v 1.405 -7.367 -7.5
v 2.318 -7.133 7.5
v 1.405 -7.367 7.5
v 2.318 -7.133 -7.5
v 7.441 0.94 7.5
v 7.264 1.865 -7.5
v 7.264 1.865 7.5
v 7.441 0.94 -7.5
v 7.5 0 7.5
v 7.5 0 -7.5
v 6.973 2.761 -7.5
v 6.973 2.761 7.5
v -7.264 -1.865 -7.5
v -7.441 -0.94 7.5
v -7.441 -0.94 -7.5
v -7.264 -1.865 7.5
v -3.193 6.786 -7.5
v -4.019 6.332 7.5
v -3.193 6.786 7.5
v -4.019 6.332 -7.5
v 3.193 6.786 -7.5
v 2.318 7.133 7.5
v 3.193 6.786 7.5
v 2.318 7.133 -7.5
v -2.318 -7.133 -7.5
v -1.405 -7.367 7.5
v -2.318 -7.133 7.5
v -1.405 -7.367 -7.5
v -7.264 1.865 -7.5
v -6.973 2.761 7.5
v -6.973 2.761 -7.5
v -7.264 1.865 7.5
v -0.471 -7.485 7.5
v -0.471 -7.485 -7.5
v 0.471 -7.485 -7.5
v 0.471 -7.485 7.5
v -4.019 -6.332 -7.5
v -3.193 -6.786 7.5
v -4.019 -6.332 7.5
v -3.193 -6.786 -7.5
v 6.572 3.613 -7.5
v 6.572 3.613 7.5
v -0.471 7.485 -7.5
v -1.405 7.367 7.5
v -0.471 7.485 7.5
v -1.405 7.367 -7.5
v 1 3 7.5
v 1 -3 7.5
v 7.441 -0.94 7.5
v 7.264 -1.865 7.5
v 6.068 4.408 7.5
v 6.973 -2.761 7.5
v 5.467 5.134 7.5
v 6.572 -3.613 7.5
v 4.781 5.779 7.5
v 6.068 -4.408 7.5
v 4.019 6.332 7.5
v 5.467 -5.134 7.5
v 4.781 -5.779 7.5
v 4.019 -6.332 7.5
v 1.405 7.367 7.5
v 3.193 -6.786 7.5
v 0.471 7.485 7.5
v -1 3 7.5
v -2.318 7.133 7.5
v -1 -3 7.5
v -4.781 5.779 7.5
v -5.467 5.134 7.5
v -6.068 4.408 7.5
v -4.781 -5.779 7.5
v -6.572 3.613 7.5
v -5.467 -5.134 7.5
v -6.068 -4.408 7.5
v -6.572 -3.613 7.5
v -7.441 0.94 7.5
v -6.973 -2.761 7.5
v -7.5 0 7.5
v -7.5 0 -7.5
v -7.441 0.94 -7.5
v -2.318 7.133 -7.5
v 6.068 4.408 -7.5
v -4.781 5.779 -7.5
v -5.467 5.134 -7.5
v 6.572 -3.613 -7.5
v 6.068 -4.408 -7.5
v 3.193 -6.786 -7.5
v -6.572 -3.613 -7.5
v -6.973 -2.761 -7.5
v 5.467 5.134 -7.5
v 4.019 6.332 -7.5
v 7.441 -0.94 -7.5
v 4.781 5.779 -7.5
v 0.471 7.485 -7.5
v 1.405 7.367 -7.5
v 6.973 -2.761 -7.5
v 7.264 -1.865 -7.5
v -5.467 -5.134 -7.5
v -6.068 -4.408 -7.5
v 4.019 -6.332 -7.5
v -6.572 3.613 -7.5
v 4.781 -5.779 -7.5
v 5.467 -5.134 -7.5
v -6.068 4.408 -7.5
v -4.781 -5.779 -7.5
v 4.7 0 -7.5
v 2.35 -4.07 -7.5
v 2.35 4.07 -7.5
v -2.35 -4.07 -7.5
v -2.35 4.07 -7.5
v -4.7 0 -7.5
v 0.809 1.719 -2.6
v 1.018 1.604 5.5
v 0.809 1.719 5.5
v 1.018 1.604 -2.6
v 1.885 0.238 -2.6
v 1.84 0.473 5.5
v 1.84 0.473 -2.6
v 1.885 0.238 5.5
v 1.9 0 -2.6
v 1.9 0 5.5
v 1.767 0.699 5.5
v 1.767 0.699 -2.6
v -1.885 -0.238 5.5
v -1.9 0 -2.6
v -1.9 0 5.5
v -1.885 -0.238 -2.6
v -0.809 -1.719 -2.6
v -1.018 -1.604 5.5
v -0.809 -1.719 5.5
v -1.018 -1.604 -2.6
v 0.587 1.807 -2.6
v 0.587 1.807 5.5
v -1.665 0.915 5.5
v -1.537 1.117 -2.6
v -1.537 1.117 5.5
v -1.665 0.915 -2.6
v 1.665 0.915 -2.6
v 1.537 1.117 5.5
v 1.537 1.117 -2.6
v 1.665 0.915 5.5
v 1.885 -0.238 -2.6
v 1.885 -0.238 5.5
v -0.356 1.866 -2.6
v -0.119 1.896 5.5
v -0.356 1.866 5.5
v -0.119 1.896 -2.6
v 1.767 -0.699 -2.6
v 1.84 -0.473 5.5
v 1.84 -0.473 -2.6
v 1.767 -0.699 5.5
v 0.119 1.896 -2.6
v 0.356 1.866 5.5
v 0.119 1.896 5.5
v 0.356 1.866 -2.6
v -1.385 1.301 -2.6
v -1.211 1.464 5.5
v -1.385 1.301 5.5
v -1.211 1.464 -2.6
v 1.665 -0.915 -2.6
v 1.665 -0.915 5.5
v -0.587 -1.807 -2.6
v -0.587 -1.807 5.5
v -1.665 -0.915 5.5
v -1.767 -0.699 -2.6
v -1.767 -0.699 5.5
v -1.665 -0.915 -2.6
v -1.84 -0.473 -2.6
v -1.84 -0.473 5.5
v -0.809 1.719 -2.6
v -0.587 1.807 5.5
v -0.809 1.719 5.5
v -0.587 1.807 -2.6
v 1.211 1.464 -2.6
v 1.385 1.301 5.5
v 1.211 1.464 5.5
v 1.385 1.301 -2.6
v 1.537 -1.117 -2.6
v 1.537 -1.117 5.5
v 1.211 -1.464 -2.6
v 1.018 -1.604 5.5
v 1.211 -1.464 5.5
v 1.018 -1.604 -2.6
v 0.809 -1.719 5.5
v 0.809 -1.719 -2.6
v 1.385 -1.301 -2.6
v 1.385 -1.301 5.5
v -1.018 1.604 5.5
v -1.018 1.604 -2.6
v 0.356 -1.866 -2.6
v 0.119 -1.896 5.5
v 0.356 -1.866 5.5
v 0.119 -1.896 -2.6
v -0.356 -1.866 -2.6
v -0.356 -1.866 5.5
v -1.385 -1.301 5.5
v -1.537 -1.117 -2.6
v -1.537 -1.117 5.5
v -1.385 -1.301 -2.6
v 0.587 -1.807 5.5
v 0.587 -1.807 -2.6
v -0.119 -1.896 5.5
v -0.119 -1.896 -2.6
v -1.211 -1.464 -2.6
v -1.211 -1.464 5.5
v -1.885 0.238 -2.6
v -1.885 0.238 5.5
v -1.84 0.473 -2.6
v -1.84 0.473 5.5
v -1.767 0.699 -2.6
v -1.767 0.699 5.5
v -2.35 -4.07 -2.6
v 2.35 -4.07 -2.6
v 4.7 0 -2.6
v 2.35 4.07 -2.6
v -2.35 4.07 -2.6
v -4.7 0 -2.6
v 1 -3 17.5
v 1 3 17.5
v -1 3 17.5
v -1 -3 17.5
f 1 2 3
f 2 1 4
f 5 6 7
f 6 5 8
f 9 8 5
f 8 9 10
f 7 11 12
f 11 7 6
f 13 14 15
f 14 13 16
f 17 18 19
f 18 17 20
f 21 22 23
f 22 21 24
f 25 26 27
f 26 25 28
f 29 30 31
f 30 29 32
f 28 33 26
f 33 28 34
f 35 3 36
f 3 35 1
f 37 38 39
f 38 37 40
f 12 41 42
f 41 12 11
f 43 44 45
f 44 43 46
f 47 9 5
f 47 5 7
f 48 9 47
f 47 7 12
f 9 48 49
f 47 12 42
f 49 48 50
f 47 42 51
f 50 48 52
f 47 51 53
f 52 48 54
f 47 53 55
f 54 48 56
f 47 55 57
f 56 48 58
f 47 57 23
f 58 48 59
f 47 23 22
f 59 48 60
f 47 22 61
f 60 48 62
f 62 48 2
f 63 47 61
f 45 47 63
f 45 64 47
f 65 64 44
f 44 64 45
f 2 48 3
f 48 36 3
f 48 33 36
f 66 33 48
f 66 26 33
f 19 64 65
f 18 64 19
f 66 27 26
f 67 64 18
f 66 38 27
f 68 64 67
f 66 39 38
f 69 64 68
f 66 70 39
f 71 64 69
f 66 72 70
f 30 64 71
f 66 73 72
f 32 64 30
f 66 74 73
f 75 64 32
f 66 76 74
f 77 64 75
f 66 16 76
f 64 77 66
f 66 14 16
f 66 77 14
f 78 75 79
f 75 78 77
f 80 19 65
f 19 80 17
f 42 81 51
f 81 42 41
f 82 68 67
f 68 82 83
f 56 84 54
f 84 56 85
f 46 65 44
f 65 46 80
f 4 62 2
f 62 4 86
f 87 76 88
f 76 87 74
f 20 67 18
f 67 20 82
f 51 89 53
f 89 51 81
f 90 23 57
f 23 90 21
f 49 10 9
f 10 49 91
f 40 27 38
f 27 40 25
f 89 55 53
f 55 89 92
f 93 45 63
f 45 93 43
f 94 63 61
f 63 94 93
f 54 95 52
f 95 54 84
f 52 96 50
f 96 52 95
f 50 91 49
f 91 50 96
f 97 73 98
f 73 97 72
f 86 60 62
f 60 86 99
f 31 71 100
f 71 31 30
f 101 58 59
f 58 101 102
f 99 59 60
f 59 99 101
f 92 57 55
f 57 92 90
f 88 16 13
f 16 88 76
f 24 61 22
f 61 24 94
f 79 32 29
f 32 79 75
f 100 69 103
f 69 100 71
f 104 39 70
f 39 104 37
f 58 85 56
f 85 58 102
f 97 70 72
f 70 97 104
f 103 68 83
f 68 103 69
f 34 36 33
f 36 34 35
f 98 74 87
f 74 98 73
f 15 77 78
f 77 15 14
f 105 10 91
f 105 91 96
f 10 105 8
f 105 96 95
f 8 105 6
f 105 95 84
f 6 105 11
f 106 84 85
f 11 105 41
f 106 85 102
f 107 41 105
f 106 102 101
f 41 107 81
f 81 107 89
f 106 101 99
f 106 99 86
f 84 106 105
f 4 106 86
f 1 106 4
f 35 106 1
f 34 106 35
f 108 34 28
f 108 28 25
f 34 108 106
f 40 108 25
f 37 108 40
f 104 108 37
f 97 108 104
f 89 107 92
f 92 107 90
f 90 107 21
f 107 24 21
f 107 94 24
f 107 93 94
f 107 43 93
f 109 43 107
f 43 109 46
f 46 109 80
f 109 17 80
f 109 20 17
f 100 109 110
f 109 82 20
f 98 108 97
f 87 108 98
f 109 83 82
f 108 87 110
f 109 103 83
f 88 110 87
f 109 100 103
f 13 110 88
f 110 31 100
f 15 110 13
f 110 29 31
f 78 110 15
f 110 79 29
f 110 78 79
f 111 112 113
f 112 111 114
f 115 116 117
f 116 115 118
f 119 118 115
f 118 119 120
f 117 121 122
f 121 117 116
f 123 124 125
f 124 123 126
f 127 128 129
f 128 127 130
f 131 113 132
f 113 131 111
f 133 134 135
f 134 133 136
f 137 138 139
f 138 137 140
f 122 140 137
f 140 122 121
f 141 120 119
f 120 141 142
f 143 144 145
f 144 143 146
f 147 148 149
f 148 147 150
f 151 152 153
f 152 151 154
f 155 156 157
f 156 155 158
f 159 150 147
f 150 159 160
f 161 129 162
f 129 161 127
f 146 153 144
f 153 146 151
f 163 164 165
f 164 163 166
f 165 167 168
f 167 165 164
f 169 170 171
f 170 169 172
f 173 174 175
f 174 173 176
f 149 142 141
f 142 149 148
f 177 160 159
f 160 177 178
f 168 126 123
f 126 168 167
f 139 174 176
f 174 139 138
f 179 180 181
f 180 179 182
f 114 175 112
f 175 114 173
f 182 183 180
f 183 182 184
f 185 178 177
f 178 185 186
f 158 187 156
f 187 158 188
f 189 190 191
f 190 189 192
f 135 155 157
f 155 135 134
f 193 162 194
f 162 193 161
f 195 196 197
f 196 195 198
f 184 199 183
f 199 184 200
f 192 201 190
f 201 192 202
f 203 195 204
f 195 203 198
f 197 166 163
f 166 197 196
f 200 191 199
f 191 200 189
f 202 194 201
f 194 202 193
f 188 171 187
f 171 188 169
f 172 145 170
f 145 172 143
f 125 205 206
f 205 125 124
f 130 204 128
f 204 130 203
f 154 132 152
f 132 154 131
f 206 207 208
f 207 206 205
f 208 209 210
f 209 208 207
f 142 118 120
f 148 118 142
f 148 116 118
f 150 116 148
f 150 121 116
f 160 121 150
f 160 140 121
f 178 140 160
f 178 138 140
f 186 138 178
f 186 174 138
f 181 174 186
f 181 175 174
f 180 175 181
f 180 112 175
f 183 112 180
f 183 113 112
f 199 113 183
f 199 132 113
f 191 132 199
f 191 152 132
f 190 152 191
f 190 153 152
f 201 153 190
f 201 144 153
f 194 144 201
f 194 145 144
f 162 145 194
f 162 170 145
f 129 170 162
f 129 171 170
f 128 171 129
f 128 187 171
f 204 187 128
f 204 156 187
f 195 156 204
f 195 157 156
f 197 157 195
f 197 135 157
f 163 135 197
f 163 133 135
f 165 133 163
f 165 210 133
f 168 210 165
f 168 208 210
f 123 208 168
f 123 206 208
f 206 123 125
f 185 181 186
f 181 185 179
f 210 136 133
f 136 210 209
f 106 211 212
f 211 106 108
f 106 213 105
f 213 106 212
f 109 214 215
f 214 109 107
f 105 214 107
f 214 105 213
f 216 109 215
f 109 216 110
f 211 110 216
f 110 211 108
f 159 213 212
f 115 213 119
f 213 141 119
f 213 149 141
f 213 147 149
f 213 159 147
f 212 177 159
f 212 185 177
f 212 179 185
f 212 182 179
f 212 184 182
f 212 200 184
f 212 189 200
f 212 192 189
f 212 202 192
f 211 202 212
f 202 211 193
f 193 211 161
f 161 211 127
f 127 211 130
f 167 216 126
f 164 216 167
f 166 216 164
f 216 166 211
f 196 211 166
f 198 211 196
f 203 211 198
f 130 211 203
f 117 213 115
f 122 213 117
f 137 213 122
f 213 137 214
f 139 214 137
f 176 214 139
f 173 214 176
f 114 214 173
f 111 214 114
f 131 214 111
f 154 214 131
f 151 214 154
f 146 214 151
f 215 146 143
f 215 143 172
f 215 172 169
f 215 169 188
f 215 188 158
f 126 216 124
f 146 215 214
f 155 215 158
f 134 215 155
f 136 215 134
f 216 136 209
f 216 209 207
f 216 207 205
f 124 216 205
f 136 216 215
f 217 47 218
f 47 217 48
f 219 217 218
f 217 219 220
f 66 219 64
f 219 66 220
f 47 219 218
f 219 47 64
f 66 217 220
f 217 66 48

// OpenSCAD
/* End stop striker for optical end stop
   -- Williams

http://www.amazon.com/OpenSCAD-3D-Printing-Al-Williams-ebook/dp/B00I6K19OM

The idea is to put an endstop bolt in through a
locknut (nylock) and then CA glue 
the nut to the body. This provides a narrow
striker for an optical end stop */


$fn=50+0;

// Main body diameter (mm)
main_diameter=15;
// Main body length (mm)
body_length=15;
// Nut diameter (mm; 8.5mm=#6)
nut_diameter=9.4;
// Nut height (mm; 5mm=#6)
nut_height=5;
// Depth to cut out nut (mm)
nut_depth=1;

// Striker length (mm)
striker_length=10;
// Striker width (mm)
striker_x=2;
// Striker height (mm)
striker_y=6;

// Bolt hole diameter (mm; 3.8=#6)
bolt_diameter=3.8;


module nutHole(size,height)
  {
  cylinder(r=size,h=height,$fn=6,center=[0,0]);
  }

union() {
translate([0,0,body_length/2+striker_length/2]) cube([striker_x,striker_y,striker_length],center=true);
difference() {
  cylinder(r=main_diameter/2,h=body_length,center=true);
  translate([0,0,-2]) cylinder(r=bolt_diameter/2,h=body_length,center=true);
translate([0,0,-(body_length/2+.1)]) nutHole(size=nut_diameter/2,height=nut_height);
}
}
